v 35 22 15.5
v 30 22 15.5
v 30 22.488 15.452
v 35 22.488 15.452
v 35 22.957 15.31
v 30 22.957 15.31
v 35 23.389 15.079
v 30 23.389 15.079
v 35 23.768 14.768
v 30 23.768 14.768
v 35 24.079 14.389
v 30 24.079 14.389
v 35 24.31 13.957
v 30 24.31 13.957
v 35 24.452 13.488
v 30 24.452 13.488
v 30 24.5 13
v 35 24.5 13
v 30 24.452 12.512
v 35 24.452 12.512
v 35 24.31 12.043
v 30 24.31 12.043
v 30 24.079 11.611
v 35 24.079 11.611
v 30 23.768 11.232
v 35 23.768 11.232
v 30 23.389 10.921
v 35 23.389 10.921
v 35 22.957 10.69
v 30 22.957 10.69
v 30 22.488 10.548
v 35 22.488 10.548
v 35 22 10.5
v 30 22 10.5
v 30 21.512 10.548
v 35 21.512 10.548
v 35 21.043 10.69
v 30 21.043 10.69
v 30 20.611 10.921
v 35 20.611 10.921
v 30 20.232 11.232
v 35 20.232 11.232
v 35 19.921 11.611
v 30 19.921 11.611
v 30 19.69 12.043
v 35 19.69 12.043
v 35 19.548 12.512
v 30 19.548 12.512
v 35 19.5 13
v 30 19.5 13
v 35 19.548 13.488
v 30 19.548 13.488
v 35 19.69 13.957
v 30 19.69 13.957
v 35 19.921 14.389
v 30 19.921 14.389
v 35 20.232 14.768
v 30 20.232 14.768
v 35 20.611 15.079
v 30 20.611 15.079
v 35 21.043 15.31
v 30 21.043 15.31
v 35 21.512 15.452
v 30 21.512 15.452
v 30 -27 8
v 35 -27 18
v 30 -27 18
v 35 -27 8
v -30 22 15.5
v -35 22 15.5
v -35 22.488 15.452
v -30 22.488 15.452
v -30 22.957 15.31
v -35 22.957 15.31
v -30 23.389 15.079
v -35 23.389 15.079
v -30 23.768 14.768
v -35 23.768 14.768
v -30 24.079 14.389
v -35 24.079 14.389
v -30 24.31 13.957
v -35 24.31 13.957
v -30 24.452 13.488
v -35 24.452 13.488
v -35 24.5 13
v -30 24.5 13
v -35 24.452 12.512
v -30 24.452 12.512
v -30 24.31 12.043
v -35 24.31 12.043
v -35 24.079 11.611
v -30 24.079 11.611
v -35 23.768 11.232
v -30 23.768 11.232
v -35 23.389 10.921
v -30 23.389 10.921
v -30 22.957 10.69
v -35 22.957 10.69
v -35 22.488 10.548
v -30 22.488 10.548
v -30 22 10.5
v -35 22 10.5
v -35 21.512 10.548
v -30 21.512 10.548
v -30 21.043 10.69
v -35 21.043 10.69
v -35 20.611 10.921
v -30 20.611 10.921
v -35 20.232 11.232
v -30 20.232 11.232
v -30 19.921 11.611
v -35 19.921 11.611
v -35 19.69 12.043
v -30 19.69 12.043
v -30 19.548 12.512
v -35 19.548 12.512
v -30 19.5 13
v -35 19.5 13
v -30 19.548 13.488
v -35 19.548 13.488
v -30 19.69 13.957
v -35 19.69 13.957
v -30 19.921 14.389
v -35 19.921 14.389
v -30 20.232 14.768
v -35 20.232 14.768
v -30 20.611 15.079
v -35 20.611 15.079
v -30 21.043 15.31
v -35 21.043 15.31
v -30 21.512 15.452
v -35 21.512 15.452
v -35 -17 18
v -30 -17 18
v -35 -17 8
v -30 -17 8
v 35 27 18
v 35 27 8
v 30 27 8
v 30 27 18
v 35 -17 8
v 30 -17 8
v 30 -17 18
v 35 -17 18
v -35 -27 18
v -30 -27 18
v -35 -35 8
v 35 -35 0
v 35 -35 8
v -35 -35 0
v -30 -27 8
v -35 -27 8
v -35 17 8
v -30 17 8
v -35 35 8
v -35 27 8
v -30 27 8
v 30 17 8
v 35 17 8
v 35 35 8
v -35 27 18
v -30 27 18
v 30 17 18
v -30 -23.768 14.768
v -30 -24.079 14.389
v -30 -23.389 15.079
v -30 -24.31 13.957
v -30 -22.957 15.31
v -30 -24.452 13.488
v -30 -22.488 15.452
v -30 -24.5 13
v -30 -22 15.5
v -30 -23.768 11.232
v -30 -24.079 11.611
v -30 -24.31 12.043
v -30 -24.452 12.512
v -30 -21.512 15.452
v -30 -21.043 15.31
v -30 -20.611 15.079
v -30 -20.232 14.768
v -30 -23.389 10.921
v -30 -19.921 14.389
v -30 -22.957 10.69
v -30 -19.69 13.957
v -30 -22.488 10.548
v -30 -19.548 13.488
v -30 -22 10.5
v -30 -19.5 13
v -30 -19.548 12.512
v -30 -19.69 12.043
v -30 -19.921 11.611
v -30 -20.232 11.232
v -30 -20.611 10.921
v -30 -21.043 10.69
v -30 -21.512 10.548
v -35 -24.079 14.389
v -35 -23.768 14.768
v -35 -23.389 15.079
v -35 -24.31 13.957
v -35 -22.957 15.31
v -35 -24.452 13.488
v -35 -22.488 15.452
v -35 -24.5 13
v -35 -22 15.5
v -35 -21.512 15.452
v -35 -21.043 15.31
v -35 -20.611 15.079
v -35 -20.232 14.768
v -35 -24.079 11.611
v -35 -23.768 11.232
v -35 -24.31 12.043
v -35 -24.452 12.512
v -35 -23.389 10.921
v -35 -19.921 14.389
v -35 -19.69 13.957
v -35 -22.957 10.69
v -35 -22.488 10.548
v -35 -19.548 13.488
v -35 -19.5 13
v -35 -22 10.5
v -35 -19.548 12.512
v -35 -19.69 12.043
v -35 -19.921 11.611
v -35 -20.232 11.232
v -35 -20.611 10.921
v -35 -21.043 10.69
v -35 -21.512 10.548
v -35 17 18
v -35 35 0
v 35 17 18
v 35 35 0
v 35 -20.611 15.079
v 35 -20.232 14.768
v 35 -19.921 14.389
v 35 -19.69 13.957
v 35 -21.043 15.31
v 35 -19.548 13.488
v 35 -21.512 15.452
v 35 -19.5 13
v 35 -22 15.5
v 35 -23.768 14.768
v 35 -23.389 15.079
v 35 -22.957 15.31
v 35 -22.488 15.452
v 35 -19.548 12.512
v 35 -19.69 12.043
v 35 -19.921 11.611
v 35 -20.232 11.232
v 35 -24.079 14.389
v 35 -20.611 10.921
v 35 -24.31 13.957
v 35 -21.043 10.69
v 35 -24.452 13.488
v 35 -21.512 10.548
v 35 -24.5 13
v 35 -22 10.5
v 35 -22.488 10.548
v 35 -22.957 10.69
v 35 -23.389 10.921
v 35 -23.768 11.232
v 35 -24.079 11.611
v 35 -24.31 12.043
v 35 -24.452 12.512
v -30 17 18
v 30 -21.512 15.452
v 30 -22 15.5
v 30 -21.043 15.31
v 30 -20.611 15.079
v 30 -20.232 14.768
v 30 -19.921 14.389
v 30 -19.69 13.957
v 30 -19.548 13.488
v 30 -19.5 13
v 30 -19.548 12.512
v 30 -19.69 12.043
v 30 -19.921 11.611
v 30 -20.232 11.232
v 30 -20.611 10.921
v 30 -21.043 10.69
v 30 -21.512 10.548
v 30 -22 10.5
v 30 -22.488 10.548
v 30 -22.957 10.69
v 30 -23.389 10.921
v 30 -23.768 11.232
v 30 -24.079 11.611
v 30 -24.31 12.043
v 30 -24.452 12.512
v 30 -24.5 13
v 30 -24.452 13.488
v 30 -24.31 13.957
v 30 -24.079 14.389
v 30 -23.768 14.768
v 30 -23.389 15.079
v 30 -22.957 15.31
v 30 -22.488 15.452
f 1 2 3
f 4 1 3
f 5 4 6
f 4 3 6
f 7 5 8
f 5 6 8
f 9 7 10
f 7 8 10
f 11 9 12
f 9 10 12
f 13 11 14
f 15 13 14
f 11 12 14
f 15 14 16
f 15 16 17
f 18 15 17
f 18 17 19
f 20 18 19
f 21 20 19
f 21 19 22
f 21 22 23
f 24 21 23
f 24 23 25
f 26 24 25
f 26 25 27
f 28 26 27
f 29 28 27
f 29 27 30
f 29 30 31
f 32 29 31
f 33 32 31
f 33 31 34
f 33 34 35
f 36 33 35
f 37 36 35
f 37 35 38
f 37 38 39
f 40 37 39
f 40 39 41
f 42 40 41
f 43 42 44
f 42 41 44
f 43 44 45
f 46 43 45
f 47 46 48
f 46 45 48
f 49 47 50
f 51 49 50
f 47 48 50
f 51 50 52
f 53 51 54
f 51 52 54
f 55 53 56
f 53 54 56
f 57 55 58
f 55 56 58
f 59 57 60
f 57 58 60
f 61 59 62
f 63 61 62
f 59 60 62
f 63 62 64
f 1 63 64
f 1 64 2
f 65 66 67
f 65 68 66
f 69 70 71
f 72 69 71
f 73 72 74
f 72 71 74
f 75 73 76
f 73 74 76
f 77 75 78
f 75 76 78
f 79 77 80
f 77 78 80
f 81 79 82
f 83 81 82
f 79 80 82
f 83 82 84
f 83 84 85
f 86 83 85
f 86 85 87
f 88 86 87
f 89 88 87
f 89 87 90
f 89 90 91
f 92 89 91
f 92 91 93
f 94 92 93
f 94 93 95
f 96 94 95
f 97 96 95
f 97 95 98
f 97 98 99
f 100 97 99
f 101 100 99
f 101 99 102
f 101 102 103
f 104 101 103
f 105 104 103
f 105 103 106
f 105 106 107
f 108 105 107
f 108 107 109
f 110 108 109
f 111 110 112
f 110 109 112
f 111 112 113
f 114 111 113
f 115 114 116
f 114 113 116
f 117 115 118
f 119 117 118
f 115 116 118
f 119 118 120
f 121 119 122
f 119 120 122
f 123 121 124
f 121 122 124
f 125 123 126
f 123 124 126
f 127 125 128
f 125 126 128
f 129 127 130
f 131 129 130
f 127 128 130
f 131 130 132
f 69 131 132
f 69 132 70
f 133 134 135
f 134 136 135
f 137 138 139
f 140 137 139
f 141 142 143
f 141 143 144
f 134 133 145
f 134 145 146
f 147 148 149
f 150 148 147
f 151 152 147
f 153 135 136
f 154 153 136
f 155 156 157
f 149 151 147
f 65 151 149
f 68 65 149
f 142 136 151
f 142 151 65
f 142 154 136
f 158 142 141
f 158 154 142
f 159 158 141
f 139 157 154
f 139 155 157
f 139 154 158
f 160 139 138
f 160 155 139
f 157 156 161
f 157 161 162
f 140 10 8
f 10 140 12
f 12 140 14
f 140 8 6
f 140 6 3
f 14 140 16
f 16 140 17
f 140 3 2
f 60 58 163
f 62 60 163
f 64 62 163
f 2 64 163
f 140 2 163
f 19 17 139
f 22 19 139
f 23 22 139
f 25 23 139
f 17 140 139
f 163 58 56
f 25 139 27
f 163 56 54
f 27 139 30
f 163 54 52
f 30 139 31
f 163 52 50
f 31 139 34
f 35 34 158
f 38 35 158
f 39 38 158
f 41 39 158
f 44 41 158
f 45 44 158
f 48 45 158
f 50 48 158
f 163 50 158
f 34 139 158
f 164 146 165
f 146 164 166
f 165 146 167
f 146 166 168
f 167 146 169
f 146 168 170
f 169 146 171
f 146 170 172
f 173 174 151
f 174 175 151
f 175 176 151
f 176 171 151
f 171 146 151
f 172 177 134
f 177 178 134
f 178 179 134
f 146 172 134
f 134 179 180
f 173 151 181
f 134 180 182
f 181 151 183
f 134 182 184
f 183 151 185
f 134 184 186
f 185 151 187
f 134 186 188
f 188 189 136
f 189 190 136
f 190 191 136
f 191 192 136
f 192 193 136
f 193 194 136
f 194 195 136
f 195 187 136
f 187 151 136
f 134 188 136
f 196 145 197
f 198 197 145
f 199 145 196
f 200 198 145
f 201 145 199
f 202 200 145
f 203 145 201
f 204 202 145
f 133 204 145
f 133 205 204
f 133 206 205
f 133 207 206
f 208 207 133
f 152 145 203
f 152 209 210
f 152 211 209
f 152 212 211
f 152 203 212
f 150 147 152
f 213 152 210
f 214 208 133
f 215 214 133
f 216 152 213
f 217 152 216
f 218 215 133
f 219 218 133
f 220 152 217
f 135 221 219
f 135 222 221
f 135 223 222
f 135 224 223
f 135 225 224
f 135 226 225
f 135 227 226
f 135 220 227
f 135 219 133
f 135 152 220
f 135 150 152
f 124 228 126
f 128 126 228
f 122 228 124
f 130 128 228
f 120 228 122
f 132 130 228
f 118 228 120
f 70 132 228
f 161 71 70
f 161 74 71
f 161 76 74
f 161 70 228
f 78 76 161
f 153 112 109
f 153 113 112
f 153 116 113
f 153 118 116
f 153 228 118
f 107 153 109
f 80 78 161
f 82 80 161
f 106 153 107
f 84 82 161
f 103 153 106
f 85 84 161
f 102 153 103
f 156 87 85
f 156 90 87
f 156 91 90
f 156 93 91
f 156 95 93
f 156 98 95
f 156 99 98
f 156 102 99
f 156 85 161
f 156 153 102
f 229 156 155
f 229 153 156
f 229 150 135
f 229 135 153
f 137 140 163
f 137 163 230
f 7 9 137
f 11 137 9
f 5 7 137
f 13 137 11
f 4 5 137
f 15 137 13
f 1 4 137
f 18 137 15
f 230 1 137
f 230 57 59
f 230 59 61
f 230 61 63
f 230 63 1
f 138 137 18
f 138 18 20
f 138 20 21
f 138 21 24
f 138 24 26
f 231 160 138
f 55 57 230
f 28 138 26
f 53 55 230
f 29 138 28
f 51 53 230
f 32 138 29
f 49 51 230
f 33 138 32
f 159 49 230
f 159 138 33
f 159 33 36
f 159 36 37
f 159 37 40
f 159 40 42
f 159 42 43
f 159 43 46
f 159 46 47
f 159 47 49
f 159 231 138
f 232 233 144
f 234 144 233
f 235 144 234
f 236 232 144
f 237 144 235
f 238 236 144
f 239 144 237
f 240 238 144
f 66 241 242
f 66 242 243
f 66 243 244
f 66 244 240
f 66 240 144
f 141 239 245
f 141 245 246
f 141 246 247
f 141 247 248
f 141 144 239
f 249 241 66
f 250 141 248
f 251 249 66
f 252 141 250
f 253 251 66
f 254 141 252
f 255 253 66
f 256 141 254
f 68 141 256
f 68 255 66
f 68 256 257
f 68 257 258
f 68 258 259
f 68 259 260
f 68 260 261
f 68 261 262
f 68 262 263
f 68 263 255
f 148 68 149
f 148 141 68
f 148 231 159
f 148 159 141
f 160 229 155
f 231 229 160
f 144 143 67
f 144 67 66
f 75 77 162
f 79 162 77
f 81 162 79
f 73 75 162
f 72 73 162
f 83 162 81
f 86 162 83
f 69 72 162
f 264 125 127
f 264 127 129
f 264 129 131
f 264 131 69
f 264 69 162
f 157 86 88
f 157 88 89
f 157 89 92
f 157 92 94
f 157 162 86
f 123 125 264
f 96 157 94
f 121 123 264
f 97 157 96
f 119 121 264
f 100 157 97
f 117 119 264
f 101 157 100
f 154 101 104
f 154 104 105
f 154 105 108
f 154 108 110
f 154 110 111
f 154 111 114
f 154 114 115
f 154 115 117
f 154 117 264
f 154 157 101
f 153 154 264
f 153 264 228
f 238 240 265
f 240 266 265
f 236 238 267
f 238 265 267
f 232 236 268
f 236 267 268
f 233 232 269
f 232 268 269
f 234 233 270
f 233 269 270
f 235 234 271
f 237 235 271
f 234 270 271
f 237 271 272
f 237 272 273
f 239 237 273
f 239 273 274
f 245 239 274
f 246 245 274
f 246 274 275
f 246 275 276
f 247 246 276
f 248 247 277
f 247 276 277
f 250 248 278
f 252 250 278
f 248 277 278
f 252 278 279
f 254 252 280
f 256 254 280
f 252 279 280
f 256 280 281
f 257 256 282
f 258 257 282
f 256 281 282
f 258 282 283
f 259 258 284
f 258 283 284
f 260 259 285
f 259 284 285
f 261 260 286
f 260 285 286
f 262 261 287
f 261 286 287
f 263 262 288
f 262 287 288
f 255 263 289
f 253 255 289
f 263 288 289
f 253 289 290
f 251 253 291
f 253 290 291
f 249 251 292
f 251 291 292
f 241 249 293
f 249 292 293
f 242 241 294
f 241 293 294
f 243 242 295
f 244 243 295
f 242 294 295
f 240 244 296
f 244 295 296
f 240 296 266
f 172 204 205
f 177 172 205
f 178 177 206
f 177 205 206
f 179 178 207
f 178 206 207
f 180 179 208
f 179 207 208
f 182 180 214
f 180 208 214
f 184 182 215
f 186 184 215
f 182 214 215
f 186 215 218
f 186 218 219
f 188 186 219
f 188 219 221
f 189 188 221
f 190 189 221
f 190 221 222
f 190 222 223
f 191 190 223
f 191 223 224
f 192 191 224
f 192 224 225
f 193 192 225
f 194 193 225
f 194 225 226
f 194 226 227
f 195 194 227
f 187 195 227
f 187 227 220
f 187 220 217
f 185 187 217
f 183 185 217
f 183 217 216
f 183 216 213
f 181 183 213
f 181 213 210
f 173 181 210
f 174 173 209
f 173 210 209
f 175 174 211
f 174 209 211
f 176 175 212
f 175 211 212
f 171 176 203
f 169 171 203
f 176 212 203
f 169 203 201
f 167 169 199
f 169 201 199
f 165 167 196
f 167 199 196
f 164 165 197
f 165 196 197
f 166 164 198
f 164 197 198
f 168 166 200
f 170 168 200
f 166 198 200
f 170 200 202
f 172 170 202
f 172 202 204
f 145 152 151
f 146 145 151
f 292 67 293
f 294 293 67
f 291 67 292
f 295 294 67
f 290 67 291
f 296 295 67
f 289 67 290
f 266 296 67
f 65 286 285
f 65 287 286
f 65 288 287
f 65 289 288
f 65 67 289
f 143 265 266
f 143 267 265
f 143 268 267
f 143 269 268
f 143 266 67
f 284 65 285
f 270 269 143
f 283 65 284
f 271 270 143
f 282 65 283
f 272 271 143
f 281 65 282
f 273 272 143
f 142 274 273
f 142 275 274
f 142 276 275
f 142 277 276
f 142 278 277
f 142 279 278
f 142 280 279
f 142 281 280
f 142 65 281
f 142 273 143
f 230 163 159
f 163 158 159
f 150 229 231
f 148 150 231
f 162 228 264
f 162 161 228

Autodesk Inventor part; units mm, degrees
ref_plane "YZ Plane" through (0, 0, 0) normal (1, 0, 0) x (0, 1, 0)
ref_plane "XZ Plane" through (0, 0, 0) normal (0, 1, 0) x (-1, 0, 0)
ref_plane "XY Plane" through (0, 0, 0) normal (0, 0, 1) x (1, 0, 0)
sketch "Sketch1" plane through (0, 0, 0) normal (0, 0, 1) x (1, 0, 0)
  line L0 (-35, 35) -> (35, 35)
  line L1 (35, 35) -> (35, -35)
  line L2 (35, -35) -> (-35, -35)
  line L3 (-35, -35) -> (-35, 35)
  point P0 (0, 0)
  dimension "d0" = 70
  dimension "d1" = 70
  dimension "d2" = 35
  dimension "d3" = 35
extrude "Extrusion1" add sketch "Sketch1" along normal blind 8
sketch "Sketch2" plane through (0, 0, 8) normal (0, 0, 1) x (1, 0, 0)
  line L0 (-35, 35) -> (-35, -35) projected
  line L1 (-35, 27) -> (-30, 27)
  line L2 (-30, 27) -> (-30, 17)
  line L3 (-30, 17) -> (-35, 17)
  line L4 (-35, 17) -> (-35, 27)
  line L5 (35, 35) -> (-35, 35) projected
  line L6 (0, -49) -> (0, 49) projected
  line L7 (35, 27) -> (30, 27)
  line L8 (30, 27) -> (30, 17)
  line L9 (30, 17) -> (35, 17)
  line L10 (35, 17) -> (35, 27)
  line L11 (-49, 0) -> (49, 0) projected
  line L12 (-35, -27) -> (-30, -27)
  line L13 (-30, -27) -> (-30, -17)
  line L14 (-30, -17) -> (-35, -17)
  line L15 (-35, -17) -> (-35, -27)
  line L16 (30, -17) -> (35, -17)
  line L17 (30, -27) -> (30, -17)
  line L18 (35, -27) -> (30, -27)
  line L19 (35, -17) -> (35, -27)
  point P0 (0, 0)
  dimension "d7" = 10
  dimension "d8" = 8
  dimension "d9" = 5
extrude "Extrusion2" add sketch "Sketch2" along normal blind 10 contours L14 L13 L12 L0 | L1 L2 L3 L0 | L10 L9 L8 L7 | L16 L19 L18 L17
sketch "Sketch3" plane through (-35, -35, 0) normal (-1, 0, 0) x (0, 0, 1)
  line L0 (8, 62) -> (8, 52) projected
  line L1 (18, 62) -> (18, 52) projected
  line L2 (8, 62) -> (18, 62) projected
  line L3 (8, 52) -> (18, 52) projected
  line L4 (8, 18) -> (8, 8) projected
  line L5 (8, 18) -> (18, 18) projected
  line L6 (8, 8) -> (18, 8) projected
  line L7 (18, 18) -> (18, 8) projected
  circle A0 centre (13, 57) radius 2.5
  circle A1 centre (13, 13) radius 2.5
  point P0 (0, 35)
  dimension "d12" = 5
  dimension "d13" = 5
  dimension "d14" = 5
  dimension "d15" = 5
  dimension "d17" = 5
extrude "Extrusion3" cut sketch "Sketch3" against normal through all contours A0 | A1
equation "\"d1\" = d0"
equation "\"d2\" = 0.5 * d0"
equation "\"d3\" = 0.5 * d0"
equation "\"d8\" = width"
equation "\"width\" = 8"
properties part number "steven_example"
